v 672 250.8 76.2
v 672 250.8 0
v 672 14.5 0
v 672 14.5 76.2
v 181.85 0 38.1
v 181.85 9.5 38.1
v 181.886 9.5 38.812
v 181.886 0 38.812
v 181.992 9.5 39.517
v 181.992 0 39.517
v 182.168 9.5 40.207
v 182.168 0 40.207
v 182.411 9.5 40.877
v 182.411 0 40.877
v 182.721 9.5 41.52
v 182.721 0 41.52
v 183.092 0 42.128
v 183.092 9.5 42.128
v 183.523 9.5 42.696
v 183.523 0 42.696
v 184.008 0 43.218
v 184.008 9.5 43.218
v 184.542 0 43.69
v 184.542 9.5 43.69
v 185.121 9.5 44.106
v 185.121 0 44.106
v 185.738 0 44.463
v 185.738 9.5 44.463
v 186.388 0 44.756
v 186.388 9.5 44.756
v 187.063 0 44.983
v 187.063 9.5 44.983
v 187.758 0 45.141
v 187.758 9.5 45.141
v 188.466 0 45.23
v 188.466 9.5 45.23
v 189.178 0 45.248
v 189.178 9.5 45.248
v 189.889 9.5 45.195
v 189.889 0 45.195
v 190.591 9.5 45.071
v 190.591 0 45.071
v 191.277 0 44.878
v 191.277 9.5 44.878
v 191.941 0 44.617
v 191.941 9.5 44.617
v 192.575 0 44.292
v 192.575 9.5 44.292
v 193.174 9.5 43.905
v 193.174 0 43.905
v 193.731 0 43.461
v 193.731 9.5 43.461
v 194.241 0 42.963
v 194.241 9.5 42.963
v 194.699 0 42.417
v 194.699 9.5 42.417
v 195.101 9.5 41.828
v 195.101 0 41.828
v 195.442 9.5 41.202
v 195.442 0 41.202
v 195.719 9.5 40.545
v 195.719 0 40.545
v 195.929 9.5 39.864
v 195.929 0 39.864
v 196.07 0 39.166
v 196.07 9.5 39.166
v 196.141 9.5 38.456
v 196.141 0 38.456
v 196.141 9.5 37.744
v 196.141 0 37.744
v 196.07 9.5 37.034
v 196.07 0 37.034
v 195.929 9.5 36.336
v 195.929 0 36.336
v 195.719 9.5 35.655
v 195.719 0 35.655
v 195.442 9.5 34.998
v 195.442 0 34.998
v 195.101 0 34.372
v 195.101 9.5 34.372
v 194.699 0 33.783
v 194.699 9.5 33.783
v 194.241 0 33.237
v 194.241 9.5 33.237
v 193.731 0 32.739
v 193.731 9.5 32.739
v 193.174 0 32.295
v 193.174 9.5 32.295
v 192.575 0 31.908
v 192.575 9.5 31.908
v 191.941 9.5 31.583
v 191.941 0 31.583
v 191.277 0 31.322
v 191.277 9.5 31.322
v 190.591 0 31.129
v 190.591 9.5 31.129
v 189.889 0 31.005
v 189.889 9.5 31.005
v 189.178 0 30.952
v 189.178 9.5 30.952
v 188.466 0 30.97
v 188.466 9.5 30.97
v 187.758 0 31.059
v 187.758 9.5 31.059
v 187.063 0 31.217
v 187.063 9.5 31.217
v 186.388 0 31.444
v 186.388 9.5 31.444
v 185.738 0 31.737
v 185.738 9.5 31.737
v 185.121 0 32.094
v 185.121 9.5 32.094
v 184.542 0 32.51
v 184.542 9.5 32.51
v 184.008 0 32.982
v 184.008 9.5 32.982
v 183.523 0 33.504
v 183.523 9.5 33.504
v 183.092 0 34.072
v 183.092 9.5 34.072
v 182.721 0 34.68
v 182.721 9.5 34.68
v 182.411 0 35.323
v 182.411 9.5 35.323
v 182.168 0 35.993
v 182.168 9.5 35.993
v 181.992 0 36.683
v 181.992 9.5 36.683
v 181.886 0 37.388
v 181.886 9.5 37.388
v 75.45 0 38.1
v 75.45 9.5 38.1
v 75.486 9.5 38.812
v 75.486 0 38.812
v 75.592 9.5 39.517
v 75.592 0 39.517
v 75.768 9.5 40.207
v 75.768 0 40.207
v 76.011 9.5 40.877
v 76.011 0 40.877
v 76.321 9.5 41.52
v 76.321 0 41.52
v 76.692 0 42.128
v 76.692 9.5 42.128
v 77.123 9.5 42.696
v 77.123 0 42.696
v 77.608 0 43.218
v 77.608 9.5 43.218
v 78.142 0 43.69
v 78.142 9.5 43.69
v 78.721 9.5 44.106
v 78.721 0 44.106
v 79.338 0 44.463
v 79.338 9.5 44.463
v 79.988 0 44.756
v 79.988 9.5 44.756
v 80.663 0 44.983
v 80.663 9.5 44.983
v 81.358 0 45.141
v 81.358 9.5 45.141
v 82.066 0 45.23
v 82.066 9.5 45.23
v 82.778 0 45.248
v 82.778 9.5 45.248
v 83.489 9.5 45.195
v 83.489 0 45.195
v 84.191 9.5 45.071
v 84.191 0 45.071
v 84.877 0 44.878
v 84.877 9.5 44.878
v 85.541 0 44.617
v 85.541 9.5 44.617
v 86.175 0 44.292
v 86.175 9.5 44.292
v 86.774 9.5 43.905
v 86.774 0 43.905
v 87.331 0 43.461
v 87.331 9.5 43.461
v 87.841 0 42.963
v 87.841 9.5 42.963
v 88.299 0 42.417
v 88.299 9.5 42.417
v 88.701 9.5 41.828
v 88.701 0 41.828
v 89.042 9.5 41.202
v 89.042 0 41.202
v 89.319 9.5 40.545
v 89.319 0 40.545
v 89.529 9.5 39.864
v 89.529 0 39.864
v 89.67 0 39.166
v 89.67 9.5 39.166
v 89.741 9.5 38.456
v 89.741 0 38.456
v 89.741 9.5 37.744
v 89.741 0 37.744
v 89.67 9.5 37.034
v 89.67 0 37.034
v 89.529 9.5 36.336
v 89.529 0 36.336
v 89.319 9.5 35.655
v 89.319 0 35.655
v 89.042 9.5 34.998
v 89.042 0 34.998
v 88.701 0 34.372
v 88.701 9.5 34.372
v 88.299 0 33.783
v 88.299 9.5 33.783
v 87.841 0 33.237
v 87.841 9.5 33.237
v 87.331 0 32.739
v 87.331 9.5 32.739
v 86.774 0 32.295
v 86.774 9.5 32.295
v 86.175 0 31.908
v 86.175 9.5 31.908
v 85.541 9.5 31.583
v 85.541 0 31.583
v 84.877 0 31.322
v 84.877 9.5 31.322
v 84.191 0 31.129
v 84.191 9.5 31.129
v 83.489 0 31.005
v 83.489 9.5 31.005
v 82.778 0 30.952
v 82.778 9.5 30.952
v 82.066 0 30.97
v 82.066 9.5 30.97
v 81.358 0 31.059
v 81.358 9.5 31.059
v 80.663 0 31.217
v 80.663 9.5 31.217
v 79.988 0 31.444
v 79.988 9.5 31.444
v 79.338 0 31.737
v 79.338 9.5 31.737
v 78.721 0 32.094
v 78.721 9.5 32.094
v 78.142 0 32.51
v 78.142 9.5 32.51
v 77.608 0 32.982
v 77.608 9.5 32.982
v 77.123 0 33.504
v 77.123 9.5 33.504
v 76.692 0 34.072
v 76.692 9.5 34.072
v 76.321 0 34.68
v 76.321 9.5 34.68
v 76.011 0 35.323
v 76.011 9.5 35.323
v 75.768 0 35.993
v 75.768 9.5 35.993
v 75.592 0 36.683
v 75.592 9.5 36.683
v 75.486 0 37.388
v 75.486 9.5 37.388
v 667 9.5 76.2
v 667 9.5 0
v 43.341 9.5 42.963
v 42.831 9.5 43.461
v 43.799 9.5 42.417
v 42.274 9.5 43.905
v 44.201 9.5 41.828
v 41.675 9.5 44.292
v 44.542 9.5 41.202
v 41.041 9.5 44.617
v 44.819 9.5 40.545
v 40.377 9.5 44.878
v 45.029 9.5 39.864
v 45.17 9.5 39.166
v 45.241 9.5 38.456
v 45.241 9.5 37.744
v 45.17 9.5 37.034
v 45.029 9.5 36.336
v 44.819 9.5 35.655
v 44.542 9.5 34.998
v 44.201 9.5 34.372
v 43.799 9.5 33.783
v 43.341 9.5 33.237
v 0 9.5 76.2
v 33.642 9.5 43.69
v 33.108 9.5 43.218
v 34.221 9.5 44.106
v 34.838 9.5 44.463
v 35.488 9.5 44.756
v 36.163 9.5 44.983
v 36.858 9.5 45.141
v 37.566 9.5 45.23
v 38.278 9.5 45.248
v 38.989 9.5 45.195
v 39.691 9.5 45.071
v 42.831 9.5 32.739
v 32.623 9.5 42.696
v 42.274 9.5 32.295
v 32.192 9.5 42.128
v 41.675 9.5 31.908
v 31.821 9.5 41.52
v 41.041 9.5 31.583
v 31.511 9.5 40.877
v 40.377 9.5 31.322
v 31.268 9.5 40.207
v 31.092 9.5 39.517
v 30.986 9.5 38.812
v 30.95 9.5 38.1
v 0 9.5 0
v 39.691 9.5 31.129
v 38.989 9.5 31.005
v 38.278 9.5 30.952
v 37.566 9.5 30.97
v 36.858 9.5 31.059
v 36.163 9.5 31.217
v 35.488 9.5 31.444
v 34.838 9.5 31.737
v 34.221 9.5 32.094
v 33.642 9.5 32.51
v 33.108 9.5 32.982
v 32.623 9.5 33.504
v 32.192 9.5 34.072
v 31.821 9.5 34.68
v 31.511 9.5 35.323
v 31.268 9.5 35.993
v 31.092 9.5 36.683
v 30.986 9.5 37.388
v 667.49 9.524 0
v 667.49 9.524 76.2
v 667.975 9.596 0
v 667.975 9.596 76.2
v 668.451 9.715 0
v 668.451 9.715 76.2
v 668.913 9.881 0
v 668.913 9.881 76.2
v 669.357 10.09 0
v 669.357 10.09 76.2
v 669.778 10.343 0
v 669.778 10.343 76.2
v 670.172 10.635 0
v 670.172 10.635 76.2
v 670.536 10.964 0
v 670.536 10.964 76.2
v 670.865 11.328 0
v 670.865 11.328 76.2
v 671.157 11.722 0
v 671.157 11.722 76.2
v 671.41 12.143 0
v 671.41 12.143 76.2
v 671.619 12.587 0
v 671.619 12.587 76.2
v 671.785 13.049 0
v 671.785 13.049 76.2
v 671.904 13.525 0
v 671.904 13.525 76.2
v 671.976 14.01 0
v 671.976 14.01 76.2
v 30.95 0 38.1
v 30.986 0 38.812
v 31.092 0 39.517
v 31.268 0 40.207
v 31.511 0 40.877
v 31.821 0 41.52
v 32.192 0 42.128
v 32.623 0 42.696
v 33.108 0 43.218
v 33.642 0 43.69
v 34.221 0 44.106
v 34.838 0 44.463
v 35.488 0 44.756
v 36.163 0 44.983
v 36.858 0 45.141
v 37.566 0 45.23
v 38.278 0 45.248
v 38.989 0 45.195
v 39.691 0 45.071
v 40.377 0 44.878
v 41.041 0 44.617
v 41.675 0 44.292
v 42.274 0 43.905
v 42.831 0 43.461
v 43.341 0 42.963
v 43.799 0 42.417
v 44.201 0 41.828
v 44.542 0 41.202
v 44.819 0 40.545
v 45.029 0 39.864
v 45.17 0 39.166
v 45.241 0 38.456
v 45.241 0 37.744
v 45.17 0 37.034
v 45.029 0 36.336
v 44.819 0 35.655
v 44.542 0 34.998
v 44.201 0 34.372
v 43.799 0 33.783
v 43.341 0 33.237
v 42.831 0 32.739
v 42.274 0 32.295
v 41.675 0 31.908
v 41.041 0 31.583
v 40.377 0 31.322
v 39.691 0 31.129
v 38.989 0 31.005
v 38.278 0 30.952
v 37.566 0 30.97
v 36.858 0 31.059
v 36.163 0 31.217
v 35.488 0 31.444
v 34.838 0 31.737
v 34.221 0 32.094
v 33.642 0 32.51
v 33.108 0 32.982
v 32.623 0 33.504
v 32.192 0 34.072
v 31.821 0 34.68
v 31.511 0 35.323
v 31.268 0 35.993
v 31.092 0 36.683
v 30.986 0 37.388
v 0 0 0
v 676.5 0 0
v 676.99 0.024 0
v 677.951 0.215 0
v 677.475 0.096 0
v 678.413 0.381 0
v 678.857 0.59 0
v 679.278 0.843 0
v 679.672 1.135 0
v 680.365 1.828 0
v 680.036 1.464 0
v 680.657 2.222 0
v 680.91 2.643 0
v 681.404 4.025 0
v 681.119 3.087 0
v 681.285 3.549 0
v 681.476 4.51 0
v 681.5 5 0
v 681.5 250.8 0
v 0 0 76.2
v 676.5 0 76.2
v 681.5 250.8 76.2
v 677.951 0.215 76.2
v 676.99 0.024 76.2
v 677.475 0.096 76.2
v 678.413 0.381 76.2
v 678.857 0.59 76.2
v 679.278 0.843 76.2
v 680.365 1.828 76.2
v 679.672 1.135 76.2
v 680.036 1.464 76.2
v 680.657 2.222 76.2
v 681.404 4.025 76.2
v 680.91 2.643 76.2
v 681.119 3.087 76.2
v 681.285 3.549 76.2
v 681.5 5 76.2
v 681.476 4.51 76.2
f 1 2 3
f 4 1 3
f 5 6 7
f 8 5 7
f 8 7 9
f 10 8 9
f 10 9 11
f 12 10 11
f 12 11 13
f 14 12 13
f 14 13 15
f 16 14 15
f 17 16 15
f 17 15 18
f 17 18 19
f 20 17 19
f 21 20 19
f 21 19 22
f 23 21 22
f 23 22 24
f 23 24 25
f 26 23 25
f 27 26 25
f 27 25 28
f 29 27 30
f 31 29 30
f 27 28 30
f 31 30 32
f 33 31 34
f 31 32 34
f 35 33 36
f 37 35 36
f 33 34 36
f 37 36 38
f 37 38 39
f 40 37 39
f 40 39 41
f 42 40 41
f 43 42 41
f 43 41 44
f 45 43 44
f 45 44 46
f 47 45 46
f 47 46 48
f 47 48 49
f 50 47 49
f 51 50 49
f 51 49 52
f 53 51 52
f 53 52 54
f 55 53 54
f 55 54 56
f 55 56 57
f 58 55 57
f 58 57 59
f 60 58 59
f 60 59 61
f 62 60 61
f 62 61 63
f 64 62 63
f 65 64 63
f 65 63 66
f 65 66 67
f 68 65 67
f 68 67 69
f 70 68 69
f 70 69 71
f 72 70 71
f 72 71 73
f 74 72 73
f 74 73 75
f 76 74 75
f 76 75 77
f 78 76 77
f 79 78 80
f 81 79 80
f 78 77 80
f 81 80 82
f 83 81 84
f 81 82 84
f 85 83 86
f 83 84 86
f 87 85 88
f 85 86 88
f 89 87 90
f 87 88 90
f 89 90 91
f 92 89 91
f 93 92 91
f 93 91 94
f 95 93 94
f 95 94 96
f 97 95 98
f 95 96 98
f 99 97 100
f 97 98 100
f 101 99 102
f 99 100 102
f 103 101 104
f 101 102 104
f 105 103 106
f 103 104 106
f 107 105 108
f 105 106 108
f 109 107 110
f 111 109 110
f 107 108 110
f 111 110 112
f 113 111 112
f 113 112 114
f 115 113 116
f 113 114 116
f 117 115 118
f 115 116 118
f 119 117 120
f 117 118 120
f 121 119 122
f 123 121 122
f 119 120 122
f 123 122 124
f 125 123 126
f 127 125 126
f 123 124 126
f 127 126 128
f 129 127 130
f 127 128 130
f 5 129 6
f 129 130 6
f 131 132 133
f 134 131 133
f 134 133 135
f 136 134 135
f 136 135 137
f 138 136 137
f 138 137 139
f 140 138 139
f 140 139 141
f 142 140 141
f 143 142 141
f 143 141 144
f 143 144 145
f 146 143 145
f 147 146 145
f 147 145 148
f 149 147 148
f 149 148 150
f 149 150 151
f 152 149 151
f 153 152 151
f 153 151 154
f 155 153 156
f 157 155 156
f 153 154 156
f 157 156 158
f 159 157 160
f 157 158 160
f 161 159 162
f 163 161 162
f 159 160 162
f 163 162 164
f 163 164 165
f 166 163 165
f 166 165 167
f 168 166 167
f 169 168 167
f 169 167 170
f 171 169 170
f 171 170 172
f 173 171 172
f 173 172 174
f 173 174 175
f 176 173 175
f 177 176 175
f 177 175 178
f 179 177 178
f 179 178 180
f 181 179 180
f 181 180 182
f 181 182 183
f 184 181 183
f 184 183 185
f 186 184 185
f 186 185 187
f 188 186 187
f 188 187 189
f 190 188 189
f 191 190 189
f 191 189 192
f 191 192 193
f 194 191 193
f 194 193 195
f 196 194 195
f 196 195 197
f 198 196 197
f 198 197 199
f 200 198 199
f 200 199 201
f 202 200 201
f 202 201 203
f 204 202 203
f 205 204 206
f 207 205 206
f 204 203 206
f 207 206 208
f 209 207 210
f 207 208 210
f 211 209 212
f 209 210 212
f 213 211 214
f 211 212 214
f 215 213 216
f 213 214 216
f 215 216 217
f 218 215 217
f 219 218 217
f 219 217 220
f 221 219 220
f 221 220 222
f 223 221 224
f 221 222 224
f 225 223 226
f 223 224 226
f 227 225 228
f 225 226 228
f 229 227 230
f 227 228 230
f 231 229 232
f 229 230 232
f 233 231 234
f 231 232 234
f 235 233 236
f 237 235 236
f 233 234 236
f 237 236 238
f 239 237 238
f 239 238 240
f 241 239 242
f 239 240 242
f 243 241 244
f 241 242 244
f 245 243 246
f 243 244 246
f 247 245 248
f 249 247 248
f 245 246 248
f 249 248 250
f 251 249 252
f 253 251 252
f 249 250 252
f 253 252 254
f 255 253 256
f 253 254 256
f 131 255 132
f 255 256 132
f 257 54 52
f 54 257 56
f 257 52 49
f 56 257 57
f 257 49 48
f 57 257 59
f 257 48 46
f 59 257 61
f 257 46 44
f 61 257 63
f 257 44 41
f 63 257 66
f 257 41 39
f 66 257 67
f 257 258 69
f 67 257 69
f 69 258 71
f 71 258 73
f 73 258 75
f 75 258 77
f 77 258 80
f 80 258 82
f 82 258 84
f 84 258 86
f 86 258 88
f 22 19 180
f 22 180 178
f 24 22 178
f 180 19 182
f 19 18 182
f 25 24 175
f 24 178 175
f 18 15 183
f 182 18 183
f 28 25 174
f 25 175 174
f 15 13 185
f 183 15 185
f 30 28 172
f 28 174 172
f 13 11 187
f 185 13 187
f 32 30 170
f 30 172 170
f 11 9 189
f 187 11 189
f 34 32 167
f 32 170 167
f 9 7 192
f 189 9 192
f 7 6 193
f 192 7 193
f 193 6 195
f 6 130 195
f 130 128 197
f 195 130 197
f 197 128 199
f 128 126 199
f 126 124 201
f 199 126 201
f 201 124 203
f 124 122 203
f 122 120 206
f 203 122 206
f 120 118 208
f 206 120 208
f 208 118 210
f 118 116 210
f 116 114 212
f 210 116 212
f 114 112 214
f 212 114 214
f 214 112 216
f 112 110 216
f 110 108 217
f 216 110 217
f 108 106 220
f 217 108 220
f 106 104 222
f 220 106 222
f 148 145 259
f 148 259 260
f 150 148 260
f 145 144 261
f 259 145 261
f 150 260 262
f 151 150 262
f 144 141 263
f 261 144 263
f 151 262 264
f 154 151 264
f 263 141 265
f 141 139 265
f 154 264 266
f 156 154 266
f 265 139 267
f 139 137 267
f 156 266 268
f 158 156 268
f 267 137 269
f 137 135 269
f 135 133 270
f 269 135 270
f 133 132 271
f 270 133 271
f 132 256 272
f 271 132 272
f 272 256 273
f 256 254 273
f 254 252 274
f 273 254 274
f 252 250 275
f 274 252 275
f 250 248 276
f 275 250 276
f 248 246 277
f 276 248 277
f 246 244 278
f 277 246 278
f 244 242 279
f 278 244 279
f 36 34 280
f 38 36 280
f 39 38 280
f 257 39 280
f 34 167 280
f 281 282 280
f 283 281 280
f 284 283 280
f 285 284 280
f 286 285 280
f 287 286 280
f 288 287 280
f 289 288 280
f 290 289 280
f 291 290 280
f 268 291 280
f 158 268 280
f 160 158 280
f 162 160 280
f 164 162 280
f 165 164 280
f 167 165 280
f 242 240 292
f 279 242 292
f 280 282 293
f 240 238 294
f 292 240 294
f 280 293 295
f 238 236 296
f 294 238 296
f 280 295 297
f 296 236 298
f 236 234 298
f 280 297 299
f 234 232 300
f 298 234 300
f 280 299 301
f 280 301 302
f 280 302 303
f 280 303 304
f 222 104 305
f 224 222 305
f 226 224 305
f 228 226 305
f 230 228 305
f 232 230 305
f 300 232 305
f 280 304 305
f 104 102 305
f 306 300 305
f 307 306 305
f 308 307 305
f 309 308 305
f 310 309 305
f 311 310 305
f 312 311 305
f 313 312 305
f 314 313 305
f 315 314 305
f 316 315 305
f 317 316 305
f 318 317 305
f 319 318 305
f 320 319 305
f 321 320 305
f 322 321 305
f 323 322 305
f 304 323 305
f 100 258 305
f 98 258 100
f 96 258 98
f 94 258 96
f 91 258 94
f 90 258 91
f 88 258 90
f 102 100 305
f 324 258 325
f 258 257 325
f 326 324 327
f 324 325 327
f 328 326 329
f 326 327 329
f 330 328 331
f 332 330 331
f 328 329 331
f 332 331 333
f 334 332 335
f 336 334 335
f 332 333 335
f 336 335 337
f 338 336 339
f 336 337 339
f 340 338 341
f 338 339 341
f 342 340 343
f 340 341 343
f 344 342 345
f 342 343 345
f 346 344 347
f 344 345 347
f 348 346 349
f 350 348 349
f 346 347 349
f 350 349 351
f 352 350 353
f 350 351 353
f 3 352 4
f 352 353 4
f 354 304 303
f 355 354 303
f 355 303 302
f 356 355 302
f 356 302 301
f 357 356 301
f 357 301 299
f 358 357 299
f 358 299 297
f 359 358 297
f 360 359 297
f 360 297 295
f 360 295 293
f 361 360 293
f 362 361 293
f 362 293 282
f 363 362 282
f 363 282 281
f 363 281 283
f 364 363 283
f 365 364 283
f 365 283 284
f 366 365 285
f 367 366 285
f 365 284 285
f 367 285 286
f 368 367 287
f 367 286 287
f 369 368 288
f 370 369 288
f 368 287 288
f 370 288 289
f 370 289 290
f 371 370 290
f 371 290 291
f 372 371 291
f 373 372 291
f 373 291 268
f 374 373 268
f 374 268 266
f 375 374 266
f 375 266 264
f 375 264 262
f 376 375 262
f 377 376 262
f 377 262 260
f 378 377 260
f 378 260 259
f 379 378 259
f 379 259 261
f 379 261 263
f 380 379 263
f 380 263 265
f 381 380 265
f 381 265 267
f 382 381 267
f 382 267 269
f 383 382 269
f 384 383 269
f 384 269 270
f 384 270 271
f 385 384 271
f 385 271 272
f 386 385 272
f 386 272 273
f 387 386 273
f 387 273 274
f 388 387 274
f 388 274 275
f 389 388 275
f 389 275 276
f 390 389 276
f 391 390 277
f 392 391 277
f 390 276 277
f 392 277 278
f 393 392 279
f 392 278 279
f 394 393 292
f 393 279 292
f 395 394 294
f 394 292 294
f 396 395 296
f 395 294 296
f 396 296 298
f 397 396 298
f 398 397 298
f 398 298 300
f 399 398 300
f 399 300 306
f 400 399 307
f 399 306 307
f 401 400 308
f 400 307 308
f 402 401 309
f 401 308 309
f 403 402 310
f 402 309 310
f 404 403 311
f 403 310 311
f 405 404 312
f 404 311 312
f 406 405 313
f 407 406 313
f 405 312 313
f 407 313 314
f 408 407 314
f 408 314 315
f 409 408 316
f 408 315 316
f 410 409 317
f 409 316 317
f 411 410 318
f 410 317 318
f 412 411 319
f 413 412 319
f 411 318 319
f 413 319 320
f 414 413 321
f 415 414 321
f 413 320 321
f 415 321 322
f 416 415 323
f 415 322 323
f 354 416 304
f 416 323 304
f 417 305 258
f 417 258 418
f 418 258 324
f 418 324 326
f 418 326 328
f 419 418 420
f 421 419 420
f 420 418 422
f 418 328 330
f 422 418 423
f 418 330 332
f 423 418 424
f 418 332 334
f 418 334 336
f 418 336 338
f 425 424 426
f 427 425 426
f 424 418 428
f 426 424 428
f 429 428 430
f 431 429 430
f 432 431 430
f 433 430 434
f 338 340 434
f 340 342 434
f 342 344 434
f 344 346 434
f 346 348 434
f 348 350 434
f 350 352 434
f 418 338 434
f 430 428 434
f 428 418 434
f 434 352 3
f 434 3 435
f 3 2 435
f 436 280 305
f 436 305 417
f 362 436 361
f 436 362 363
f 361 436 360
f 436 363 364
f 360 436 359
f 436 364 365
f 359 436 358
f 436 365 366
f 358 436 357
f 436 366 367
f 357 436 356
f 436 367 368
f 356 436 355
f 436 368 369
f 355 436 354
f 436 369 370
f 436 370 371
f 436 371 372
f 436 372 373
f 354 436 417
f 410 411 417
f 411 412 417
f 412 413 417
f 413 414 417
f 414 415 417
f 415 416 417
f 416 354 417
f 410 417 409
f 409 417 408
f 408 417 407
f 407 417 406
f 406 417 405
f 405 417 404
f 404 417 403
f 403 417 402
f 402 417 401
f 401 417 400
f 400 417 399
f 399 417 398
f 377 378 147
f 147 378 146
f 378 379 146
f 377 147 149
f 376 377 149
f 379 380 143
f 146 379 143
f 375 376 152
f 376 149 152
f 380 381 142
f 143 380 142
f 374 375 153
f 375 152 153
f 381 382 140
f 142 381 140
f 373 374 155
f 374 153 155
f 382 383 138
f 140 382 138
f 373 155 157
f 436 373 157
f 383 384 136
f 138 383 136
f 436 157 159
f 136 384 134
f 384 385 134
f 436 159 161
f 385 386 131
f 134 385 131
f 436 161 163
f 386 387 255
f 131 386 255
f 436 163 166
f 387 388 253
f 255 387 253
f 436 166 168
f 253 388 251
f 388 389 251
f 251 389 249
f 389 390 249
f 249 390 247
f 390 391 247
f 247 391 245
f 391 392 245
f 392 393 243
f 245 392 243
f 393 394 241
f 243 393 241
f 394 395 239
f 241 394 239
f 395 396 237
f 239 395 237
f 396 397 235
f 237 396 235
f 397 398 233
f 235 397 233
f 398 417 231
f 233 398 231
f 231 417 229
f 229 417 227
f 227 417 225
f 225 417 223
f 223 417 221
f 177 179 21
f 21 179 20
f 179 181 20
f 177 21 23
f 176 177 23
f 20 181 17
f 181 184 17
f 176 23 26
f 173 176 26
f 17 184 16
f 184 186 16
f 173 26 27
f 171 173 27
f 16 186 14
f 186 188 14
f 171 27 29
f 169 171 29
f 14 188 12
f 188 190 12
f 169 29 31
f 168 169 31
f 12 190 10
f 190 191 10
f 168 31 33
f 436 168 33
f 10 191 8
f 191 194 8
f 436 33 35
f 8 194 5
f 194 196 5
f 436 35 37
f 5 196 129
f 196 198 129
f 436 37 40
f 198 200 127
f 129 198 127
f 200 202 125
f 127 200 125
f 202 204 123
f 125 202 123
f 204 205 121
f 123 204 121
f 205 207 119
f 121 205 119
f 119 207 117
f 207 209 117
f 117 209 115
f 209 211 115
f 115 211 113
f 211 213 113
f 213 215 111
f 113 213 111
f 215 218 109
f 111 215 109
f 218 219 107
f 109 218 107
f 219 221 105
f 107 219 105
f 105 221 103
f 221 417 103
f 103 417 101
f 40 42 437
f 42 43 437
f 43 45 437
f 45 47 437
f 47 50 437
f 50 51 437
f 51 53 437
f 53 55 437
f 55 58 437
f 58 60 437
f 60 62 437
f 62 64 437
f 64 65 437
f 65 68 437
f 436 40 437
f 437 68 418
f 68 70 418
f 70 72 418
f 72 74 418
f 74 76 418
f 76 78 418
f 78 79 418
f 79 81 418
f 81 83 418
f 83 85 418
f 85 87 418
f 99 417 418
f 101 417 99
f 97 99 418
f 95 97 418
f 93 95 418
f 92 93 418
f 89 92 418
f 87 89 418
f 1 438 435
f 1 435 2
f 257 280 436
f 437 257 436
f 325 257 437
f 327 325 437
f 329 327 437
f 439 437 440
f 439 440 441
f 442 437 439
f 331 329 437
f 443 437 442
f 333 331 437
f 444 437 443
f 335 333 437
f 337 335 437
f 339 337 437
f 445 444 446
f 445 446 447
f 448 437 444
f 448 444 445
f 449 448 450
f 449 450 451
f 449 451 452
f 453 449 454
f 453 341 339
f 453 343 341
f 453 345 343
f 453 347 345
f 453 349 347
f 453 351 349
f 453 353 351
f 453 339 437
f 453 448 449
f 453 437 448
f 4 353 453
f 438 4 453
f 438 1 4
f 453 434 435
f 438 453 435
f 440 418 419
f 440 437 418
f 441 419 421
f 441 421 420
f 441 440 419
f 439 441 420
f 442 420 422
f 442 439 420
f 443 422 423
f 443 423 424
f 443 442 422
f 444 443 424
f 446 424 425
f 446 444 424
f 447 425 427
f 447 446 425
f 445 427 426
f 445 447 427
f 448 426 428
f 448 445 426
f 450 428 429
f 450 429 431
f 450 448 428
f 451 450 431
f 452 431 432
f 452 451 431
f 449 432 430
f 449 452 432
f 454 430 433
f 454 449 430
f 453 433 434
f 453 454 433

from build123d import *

# Parameters (mm, degrees)
F1_DEPTH = 76.2
F2_R     = 7.15
F3_DEPTH = 9.501
F4_R     = 5
F5_R     = 5


with BuildPart() as f1:
    # F0 (on Top) → F1 (new body)
    with BuildSketch(Plane.XY):
        Polygon((0, 9.5), (0, 0), (681.5, 0), (681.5, 250.8), (672, 250.8), (672, 9.5), align=None)
    extrude(amount=F1_DEPTH)

    # F2 (on face) → F3 (cut, through all)
    with BuildSketch(Plane(origin=(0, 9.5, 0), x_dir=(-1, 0, 0), z_dir=(0, 1, 0))):
        with Locations((-38.1, 38.1)):
            Circle(F2_R)
        with Locations((-82.6, 38.1)):
            Circle(F2_R)
        with Locations((-189, 38.1)):
            Circle(F2_R)
    extrude(amount=-F3_DEPTH, mode=Mode.SUBTRACT)

    # F4
    f4_edges = [f1.edges().sort_by_distance(p)[0] for p in [
        (681.5, 0, 38.1),
    ]]
    fillet(f4_edges, radius=F4_R)

    # F5
    f5_edges = [f1.edges().sort_by_distance(p)[0] for p in [
        (672, 9.5, 38.1),
    ]]
    fillet(f5_edges, radius=F5_R)


solid = f1.part
